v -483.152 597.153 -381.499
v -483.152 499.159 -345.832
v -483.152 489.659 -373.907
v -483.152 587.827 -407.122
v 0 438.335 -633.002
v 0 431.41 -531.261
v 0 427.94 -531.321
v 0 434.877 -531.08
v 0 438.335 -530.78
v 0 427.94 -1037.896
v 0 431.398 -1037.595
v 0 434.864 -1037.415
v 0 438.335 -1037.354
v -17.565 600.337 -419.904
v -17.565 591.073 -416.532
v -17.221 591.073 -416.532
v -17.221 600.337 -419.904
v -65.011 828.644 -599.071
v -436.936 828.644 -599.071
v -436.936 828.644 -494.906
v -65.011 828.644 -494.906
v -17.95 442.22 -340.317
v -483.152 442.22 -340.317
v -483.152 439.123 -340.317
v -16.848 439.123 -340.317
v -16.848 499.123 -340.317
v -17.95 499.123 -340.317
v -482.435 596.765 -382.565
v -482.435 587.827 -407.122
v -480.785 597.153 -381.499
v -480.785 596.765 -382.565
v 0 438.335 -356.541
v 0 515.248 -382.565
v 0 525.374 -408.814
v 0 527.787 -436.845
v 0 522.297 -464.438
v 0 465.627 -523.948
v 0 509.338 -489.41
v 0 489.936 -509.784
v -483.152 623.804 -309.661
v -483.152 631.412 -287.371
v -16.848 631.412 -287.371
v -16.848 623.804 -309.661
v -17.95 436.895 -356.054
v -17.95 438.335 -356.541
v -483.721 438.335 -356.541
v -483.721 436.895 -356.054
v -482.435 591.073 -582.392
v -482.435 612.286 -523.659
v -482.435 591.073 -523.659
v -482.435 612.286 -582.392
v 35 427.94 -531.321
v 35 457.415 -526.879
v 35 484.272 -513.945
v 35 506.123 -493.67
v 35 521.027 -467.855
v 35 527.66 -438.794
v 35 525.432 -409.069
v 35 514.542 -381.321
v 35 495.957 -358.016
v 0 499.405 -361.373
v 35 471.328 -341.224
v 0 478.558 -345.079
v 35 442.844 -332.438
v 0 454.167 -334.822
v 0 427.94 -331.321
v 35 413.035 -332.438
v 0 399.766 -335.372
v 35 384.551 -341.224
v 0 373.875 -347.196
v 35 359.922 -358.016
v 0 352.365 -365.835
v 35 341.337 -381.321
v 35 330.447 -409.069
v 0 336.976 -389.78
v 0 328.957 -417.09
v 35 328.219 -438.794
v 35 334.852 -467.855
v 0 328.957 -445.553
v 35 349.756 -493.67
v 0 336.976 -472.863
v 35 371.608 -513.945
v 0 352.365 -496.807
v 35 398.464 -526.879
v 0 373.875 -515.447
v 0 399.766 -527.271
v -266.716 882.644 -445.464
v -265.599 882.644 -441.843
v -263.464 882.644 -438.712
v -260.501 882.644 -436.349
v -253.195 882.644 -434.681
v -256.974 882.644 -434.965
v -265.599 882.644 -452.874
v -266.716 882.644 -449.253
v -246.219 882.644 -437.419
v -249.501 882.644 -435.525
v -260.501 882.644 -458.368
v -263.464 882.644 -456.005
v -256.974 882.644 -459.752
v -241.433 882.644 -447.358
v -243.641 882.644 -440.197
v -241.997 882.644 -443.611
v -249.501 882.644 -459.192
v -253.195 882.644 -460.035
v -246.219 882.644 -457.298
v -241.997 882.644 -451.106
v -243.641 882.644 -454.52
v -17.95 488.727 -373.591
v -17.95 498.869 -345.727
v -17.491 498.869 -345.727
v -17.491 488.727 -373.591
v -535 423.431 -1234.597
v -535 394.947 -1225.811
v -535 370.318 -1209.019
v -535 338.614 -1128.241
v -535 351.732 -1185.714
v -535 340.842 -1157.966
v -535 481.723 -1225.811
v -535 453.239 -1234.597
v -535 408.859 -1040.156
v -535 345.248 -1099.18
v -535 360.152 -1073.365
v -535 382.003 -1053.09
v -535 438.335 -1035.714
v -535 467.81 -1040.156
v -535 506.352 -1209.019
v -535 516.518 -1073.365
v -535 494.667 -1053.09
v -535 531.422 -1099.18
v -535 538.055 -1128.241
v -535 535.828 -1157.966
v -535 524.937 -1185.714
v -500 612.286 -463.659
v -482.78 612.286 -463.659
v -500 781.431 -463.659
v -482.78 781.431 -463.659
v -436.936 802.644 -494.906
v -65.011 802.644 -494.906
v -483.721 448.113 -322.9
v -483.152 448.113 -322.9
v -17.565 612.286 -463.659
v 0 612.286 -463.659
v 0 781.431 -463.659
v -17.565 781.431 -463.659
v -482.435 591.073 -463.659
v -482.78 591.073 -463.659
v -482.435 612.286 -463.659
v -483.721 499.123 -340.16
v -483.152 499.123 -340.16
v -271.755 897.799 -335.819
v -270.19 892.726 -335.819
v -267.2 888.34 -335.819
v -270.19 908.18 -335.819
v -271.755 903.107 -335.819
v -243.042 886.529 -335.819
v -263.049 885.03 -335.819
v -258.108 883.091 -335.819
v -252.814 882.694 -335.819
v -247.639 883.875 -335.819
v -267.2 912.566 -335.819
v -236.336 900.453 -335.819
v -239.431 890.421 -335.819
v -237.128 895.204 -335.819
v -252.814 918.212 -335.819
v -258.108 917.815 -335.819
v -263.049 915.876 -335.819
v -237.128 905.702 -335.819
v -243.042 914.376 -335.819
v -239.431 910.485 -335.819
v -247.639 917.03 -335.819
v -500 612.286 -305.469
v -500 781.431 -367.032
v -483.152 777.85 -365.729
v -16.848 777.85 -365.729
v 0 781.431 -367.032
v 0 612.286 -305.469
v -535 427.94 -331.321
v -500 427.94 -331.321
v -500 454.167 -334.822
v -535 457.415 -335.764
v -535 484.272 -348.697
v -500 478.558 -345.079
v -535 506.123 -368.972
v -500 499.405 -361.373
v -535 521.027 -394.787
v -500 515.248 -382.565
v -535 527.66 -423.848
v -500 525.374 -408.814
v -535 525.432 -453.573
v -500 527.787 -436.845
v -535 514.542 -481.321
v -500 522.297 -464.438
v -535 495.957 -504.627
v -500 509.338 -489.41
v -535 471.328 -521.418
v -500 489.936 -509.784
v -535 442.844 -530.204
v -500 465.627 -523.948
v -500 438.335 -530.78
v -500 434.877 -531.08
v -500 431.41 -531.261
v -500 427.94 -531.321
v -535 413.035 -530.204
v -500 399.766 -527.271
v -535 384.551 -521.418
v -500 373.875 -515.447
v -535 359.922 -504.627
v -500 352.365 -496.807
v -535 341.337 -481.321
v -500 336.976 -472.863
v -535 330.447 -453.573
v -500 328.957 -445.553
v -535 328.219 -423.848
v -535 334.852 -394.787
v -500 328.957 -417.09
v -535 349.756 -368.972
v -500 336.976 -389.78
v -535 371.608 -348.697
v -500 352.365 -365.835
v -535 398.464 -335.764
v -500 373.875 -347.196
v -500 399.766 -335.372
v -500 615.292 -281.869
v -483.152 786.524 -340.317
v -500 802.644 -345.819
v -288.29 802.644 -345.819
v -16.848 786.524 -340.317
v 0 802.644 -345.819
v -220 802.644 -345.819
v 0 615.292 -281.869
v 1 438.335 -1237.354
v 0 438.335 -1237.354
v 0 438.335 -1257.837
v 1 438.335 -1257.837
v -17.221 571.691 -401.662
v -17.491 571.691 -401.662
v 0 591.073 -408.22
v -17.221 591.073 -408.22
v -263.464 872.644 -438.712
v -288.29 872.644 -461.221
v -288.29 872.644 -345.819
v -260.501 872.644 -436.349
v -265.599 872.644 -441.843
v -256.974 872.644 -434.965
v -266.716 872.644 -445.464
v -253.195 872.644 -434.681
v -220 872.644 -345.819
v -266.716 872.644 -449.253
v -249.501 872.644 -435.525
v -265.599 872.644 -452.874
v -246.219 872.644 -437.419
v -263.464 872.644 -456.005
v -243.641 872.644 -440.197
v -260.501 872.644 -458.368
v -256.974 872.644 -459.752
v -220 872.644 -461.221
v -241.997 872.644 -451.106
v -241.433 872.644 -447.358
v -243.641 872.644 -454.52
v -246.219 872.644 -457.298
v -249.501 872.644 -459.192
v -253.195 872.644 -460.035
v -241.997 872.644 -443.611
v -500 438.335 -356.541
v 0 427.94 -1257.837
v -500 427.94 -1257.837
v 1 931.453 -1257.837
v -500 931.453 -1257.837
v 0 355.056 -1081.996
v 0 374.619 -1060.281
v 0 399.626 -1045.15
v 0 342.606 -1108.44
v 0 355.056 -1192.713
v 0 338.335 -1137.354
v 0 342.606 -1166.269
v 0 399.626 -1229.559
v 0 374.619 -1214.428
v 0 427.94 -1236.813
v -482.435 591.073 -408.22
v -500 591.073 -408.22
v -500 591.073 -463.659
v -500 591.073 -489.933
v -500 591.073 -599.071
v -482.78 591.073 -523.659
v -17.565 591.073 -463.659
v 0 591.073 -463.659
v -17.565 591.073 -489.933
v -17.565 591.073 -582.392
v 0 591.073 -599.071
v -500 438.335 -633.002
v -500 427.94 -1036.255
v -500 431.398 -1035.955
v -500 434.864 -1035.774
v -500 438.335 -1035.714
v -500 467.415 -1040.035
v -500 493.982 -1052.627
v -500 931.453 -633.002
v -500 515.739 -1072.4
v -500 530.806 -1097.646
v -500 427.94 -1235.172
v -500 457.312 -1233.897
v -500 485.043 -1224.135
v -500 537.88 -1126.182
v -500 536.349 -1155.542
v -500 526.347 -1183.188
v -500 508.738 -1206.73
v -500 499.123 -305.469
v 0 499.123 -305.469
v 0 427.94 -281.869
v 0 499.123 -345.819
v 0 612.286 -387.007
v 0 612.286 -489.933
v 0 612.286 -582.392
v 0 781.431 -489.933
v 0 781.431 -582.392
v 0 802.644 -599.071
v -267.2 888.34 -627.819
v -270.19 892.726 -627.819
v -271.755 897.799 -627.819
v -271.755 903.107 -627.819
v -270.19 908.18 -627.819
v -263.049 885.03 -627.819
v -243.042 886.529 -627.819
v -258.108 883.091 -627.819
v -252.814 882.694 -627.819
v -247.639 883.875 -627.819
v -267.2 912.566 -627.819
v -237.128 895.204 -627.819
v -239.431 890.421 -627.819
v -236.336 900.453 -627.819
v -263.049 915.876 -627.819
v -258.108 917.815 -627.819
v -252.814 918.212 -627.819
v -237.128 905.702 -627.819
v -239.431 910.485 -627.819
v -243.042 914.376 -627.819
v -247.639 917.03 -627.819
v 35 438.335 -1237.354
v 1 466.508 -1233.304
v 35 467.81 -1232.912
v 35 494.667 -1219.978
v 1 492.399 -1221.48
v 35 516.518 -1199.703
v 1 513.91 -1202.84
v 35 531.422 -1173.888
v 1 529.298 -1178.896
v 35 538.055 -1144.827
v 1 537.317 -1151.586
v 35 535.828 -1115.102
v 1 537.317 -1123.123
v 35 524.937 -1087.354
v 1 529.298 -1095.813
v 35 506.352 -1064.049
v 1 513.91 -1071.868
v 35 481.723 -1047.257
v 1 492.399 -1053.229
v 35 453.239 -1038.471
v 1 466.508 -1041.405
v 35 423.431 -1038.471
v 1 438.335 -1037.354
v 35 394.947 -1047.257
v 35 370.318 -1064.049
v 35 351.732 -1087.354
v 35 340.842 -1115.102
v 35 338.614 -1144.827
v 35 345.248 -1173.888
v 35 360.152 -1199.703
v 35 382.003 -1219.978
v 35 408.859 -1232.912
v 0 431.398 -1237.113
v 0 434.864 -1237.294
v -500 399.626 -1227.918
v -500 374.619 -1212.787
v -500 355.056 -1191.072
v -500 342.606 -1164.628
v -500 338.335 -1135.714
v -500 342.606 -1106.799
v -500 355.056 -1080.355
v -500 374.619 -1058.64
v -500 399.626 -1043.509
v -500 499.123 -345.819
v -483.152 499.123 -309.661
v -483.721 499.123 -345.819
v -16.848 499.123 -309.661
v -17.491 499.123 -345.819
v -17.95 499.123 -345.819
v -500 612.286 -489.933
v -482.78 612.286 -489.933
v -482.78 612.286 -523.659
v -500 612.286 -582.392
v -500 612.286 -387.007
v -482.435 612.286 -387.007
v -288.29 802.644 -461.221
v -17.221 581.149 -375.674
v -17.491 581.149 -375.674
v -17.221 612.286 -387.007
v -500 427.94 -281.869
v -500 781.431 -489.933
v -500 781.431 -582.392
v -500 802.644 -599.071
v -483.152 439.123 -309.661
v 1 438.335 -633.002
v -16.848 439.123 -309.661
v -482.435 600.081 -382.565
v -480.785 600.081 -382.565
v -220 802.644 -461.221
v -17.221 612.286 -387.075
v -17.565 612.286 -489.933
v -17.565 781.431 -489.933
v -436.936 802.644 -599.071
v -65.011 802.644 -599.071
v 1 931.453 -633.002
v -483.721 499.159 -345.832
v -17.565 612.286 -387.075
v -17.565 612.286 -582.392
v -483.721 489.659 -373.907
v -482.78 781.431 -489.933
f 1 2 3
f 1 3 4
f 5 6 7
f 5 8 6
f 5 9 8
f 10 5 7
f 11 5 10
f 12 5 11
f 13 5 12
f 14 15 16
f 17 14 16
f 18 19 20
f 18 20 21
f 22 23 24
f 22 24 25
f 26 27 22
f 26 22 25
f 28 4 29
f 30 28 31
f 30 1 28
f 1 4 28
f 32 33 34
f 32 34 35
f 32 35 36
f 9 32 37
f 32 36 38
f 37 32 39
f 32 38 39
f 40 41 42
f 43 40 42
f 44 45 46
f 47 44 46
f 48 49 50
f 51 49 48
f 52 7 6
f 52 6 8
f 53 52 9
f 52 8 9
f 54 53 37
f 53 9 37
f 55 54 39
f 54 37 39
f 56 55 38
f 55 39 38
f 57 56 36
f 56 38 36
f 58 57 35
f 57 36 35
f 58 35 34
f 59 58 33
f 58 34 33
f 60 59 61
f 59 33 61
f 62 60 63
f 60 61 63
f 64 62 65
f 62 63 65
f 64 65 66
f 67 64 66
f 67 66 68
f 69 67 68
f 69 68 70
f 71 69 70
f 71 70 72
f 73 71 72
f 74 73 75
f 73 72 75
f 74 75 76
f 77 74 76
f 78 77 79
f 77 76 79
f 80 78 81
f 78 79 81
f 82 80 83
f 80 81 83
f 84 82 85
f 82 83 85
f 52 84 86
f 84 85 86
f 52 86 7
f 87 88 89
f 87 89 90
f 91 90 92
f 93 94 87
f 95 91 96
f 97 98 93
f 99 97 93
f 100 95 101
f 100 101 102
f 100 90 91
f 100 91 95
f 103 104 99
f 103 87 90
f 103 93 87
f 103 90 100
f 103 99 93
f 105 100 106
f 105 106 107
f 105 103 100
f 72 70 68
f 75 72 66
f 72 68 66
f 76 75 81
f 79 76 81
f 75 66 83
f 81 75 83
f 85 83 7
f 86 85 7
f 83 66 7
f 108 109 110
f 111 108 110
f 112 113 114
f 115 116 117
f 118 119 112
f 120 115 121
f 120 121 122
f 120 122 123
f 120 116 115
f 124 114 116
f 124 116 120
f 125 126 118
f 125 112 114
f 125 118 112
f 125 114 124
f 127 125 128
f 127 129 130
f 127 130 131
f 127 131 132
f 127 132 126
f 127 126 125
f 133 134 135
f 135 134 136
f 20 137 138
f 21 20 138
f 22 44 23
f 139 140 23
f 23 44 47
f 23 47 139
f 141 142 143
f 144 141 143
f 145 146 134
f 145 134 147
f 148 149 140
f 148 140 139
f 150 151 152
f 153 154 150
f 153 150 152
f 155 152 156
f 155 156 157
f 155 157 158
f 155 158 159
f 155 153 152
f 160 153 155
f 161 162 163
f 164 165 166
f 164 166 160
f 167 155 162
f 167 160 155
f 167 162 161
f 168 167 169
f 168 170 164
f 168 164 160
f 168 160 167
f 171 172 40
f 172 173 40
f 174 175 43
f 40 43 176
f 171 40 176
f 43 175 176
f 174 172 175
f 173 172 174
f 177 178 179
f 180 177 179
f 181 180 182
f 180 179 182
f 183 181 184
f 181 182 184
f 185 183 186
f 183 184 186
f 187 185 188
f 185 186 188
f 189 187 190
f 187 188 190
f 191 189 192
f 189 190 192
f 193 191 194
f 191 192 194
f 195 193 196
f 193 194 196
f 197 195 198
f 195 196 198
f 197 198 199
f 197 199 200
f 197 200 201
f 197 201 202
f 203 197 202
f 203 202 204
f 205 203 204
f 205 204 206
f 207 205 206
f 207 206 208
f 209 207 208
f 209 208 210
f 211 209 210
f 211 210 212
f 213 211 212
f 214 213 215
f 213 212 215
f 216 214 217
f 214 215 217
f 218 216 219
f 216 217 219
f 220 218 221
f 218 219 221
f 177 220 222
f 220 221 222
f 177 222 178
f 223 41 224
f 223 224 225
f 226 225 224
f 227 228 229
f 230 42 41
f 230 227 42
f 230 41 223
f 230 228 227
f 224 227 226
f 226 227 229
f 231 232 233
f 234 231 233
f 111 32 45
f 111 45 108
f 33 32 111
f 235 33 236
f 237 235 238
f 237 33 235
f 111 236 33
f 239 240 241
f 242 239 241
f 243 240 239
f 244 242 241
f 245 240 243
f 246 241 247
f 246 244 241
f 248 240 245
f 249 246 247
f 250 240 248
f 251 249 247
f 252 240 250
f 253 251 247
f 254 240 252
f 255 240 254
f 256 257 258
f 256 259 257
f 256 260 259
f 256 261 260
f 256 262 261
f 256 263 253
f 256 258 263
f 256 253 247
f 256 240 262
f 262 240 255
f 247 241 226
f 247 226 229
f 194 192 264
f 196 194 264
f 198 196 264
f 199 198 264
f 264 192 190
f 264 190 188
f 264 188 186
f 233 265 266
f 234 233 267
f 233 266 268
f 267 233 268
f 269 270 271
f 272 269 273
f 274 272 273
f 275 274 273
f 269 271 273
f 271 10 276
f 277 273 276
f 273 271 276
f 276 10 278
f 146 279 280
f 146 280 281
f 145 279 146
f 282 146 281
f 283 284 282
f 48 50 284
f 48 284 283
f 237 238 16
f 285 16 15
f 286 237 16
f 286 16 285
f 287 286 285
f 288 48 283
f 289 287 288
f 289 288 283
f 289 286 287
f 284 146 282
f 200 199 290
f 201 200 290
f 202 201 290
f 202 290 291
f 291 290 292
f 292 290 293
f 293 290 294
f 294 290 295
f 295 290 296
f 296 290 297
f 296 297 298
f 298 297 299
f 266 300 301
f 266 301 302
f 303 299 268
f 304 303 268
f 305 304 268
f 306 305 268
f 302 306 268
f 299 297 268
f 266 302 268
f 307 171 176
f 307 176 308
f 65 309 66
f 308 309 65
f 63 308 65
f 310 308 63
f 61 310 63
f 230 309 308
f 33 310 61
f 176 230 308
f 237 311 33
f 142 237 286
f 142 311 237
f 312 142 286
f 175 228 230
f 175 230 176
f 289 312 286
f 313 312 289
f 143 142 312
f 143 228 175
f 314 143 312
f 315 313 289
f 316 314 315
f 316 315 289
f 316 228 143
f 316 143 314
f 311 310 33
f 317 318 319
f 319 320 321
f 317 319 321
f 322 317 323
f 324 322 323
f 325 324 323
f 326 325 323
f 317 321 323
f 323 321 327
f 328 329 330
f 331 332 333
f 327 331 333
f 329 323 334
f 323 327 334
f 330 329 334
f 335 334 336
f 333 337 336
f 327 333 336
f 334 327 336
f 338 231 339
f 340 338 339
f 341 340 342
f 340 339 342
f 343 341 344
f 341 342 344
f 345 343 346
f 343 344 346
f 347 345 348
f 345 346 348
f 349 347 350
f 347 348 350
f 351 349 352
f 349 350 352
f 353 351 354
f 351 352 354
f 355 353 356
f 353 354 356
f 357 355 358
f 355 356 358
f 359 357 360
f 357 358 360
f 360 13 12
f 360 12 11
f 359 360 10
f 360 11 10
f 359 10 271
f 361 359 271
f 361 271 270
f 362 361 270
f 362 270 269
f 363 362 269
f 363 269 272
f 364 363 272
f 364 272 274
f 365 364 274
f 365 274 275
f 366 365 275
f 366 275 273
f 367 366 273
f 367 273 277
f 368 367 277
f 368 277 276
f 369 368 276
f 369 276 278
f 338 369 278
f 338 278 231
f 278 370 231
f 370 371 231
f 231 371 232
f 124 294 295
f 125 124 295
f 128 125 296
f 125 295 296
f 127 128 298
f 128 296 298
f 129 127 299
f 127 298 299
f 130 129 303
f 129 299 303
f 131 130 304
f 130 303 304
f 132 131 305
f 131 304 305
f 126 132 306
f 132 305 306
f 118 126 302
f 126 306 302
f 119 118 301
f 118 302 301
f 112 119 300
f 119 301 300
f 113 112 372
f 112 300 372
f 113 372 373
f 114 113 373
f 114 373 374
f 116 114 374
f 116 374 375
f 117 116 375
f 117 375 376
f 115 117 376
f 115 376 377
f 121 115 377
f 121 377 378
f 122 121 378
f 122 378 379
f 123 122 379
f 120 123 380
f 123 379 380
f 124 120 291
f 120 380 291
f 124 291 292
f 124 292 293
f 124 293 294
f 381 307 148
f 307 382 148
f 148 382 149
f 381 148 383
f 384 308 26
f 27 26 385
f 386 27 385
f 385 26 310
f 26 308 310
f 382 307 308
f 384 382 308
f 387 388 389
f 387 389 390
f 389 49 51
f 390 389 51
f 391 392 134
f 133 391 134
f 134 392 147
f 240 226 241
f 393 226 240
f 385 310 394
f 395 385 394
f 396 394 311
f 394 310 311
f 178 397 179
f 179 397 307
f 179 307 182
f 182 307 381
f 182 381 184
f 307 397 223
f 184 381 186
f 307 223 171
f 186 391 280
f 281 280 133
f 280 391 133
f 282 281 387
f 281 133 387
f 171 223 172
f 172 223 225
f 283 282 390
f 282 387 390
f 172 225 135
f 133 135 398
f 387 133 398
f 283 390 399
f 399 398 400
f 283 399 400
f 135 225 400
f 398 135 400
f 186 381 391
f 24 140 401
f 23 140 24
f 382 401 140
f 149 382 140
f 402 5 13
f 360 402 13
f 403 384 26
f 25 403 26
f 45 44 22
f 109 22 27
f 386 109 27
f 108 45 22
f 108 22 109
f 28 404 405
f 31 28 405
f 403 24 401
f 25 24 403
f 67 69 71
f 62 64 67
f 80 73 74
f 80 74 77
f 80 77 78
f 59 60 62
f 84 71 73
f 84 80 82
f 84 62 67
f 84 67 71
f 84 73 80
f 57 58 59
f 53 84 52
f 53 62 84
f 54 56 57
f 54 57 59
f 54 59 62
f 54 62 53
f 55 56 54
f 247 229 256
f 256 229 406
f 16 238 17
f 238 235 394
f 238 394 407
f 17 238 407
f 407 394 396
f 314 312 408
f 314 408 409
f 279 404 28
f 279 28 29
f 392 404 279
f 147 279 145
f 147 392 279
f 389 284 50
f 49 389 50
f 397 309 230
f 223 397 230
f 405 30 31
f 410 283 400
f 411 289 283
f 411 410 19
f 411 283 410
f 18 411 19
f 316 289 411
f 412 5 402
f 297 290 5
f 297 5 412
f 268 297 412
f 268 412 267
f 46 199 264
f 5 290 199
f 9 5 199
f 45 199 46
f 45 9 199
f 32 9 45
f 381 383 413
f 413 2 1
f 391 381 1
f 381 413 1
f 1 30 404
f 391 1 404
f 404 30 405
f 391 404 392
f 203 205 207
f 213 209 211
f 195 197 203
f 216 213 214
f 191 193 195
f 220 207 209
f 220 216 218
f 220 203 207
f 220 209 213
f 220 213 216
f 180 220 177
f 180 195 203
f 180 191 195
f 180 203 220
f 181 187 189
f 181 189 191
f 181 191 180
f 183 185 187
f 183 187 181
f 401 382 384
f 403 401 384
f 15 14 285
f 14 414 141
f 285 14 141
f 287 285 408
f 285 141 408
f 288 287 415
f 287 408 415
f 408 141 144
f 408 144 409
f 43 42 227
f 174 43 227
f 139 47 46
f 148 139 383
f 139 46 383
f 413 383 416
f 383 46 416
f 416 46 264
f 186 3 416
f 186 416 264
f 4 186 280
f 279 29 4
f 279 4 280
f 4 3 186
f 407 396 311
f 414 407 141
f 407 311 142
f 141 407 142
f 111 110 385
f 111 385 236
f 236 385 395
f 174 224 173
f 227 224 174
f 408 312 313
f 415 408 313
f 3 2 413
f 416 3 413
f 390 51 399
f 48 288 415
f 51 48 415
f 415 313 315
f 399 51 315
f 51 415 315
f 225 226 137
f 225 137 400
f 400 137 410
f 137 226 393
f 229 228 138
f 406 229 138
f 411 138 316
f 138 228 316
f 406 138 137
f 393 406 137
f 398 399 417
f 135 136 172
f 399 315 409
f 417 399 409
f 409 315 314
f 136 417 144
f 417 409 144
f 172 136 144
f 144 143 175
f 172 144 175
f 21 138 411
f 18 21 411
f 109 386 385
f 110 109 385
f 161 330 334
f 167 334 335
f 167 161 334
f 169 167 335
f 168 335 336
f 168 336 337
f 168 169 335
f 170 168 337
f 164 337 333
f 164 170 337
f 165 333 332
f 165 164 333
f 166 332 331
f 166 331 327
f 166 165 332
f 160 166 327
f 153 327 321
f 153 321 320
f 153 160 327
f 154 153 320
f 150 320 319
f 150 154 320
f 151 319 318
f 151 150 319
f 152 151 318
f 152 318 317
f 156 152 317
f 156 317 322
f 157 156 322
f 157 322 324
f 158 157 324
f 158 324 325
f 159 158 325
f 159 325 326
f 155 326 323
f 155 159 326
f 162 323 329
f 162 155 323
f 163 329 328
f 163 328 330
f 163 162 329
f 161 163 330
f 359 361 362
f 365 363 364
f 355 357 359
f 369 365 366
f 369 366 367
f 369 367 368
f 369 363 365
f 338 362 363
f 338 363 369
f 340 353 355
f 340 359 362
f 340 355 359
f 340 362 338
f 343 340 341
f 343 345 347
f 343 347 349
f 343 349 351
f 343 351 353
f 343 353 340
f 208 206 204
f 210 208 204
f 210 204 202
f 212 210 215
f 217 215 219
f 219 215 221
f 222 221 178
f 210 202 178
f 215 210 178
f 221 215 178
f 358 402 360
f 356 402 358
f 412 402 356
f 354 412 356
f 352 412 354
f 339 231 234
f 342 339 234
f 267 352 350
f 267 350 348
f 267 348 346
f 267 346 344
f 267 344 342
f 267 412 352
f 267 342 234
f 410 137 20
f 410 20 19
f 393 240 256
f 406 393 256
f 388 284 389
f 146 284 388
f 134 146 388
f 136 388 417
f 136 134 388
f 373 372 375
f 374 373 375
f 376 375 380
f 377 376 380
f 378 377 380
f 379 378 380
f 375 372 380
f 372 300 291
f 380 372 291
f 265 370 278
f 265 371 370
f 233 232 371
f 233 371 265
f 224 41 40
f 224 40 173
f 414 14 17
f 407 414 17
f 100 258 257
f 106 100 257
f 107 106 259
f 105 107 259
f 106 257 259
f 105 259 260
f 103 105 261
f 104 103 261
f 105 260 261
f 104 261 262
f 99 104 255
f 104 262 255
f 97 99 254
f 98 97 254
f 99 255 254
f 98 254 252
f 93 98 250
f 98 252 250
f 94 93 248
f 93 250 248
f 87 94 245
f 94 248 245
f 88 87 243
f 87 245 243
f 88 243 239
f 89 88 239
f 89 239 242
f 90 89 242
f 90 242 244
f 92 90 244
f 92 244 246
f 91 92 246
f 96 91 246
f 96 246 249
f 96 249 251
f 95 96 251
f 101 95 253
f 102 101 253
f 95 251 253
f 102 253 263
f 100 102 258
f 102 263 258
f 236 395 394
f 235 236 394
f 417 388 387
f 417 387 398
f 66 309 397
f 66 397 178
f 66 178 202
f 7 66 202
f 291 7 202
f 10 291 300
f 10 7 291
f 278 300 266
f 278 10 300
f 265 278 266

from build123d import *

# Parameters (mm, degrees)
IZIM2_W                           = 624.83438286
IZIM2_H                           = 493.118424104
Y_KSEKLIK_EKSTR_ZYON1_DEPTH       = 500
IZIM4_R                           = 100
Y_KSEKLIK_EKSTR_ZYON2_DEPTH       = 35
IZIM5_W                           = 975.967830922
IZIM5_H                           = 10.395315862
Y_KSEKLIK_EKSTR_ZYON3_DEPTH       = 500
IZIM6_W                           = 317.202351564
IZIM6_H                           = 374.704466417
Y_KSEKLIK_EKSTR_ZYON4_DEPTH       = 500
KES_EKSTR_ZYON1_DEPTH             = 500
KES_EKSTR_ZYON2_DEPTH             = 500
KES_EKSTR_ZYON3_DEPTH             = 500
IZIM11_R                          = 100
Y_KSEKLIK_EKSTR_ZYON5_DEPTH       = 35
IZIM12_W                          = 466.303391348
IZIM12_H                          = 163.89871841
KES_EKSTR_ZYON4_DEPTH             = 35
IZIM17_W                          = 464.870730912
IZIM17_H                          = 199.827267797
KES_EKSTR_ZYON7_DEPTH             = 35
IZIM20_W                          = 465.660425645
IZIM20_H                          = 104.591429086
KES_EKSTR_ZYON8_DEPTH             = 35
IZIM21_W                          = 463.56331291
IZIM21_H                          = 33.15833205
KES_EKSTR_ZYON9_DEPTH             = 35
IZIM22_W                          = 465.770217683
IZIM22_H                          = 55.70279957
KES_EKSTR_ZYON10_DEPTH            = 35
IZIM23_W                          = 466.303391348
IZIM23_H                          = 30.655819637
KES_EKSTR_ZYON11_DEPTH            = 60
IZIM25_W                          = 26.274086754
IZIM25_H                          = 211.571078613
Y_KSEKLIK_EKSTR_ZYON6_DEPTH       = 500
IZIM27_W                          = 465.215365456
IZIM27_H                          = 190.357875177
KES_EKSTR_ZYON12_DEPTH            = 60
IZIM28_R                          = 100
Y_KSEKLIK_EKSTR_ZYON7_DEPTH       = 35
IZIM46_W                          = 68.290210942
IZIM46_H                          = 115.402230531
Y_KSEKLIK_EKSTR_ZYON14_DEPTH      = 70
IZIM47_R                          = 12.712595137
Y_KSEKLIK_EKSTR_ZYON15_DEPTH      = 10
IZIM48_R                          = 17.808743389
Y_KSEKLIK_EKSTR_ZYON18_DEPTH      = 10
Y_KSEKLIK_EKSTR_ZYON18_DEPTH_BACK = 282
IZIM49_W                          = 371.925281581
IZIM49_H                          = 104.164908848
Y_KSEKLIK_EKSTR_ZYON19_DEPTH      = 26
IZIM54_W                          = 624.83438286
IZIM54_H                          = 493.118424104
Y_KSEKLIK_EKSTR_ZYON20_DEPTH      = 1


with BuildPart() as part:
    # Çizim2 → Yükseklik-Ekstrüzyon1 (new body)
    with BuildSketch(Plane(origin=(0, 0, 0), x_dir=(0, 0, -1), z_dir=(1, 0, 0))):
        with Locations((945.419542605, 684.894087956)):
            Rectangle(IZIM2_W, IZIM2_H)
    extrude(amount=-Y_KSEKLIK_EKSTR_ZYON1_DEPTH)

    # Çizim4 → Yükseklik-Ekstrüzyon2 (add)
    with BuildSketch(Plane(origin=(0, 0, 0), x_dir=(0, 0, -1), z_dir=(1, 0, 0))):
        with Locations((1137.354295612, 438.334875904)):
            Circle(IZIM4_R)
    extrude(amount=Y_KSEKLIK_EKSTR_ZYON2_DEPTH)

    # Çizim5 → Yükseklik-Ekstrüzyon3 (add)
    with BuildSketch(Plane(origin=(0, 0, 0), x_dir=(0, 0, -1), z_dir=(1, 0, 0))):
        with Locations((769.852818574, 433.137217973)):
            Rectangle(IZIM5_W, IZIM5_H)
    extrude(amount=-Y_KSEKLIK_EKSTR_ZYON3_DEPTH)

    # Çizim6 → Yükseklik-Ekstrüzyon4 (add)
    with BuildSketch(Plane(origin=(0, 0, 0), x_dir=(0, 0, -1), z_dir=(1, 0, 0))):
        with Locations((440.470078895, 615.291793251)):
            Rectangle(IZIM6_W, IZIM6_H)
    extrude(amount=-Y_KSEKLIK_EKSTR_ZYON4_DEPTH)

    # Çizim7 → Kes-Ekstrüzyon1 (cut)
    with BuildSketch(Plane(origin=(0, 0, 0), x_dir=(0, 0, -1), z_dir=(1, 0, 0))):
        Polygon((281.868903113, 802.644026459), (345.819234143, 802.644026459), (281.868903113, 615.29179325), align=None)
    extrude(amount=-KES_EKSTR_ZYON1_DEPTH, mode=Mode.SUBTRACT)

    # Çizim8 → Kes-Ekstrüzyon2 (cut)
    with BuildSketch(Plane(origin=(0, 0, 0), x_dir=(0, 0, -1), z_dir=(1, 0, 0))):
        Polygon((367.032437579, 781.430823023), (305.46881178, 612.286151281), (305.46881178, 499.123252309), (345.819234143, 499.123252309), (387.007160993, 612.286151281), (582.392266599, 612.286151281), (582.392266599, 781.430823023), align=None)
    extrude(amount=-KES_EKSTR_ZYON2_DEPTH, mode=Mode.SUBTRACT)

    # Çizim10 → Kes-Ekstrüzyon3 (cut)
    with BuildSketch(Plane(origin=(0, 0, 0), x_dir=(0, 0, -1), z_dir=(1, 0, 0))):
        Polygon((599.071254677, 438.334875904), (356.541223106, 438.334875904), (408.220364428, 591.072947846), (599.071254677, 591.072947846), align=None)
    extrude(amount=-KES_EKSTR_ZYON3_DEPTH, mode=Mode.SUBTRACT)

    # Çizim11 → Yükseklik-Ekstrüzyon5 (add)
    with BuildSketch(Plane(origin=(0, 0, 0), x_dir=(0, 0, -1), z_dir=(1, 0, 0))):
        with Locations((431.321316174, 427.939560042)):
            Circle(IZIM11_R)
    extrude(amount=Y_KSEKLIK_EKSTR_ZYON5_DEPTH)

    # Çizim12 → Kes-Ekstrüzyon4 (cut)
    with BuildSketch(Plane(origin=(0, -21.964844226, -64.349355999), x_dir=(1, 0, 0), z_dir=(0, 0.323037077, 0.94638631))):
        with Locations((-250, 772.34079435)):
            Rectangle(IZIM12_W, IZIM12_H)
    extrude(amount=-KES_EKSTR_ZYON4_DEPTH, mode=Mode.SUBTRACT)

    # Çizim17 → Kes-Ekstrüzyon7 (cut)
    with BuildSketch(Plane(origin=(0, 612.286151281, 0), x_dir=(1, 0, 0), z_dir=(0, 1, 0))):
        with Locations((-250, 482.478632701)):
            Rectangle(IZIM17_W, IZIM17_H)
    extrude(amount=-KES_EKSTR_ZYON7_DEPTH, mode=Mode.SUBTRACT)

    # Çizim20 → Kes-Ekstrüzyon8 (cut)
    with BuildSketch(Plane(origin=(0, -52.757830226, -144.950947246), x_dir=(1, 0, 0), z_dir=(0, 0.342020143, 0.939692621))):
        with Locations((-250.321482852, 639.324434245)):
            Rectangle(IZIM20_W, IZIM20_H)
    extrude(amount=-KES_EKSTR_ZYON8_DEPTH, mode=Mode.SUBTRACT)

    # Çizim21 → Kes-Ekstrüzyon9 (cut)
    with BuildSketch(Plane(origin=(0, -52.757830226, -144.950947246), x_dir=(1, 0, 0), z_dir=(0, 0.342020143, 0.939692621))):
        with Locations((-249.003107825, 691.169166414)):
            Rectangle(IZIM21_W, IZIM21_H)
    extrude(amount=-KES_EKSTR_ZYON9_DEPTH, mode=Mode.SUBTRACT)

    # Çizim22 → Kes-Ekstrüzyon10 (cut)
    with BuildSketch(Plane(origin=(0, -63.217651249, -186.84022059), x_dir=(-1, 0, 0), z_dir=(0, -0.320502572, -0.947247645))):
        with Locations((250.835570057, 555.815526561)):
            Rectangle(IZIM22_W, IZIM22_H)
    extrude(amount=-KES_EKSTR_ZYON10_DEPTH, mode=Mode.SUBTRACT)

    # Çizim23 → Kes-Ekstrüzyon11 (cut)
    with BuildSketch(Plane(origin=(0, 499.123252309, 0), x_dir=(1, 0, 0), z_dir=(0, 1, 0))):
        with Locations((-250, 324.988840267)):
            Rectangle(IZIM23_W, IZIM23_H)
    extrude(amount=-KES_EKSTR_ZYON11_DEPTH, mode=Mode.SUBTRACT)

    # Çizim25 → Yükseklik-Ekstrüzyon6 (add)
    with BuildSketch(Plane(origin=(0, 0, 0), x_dir=(0, 0, -1), z_dir=(1, 0, 0))):
        with Locations((476.795697093, 696.858487153)):
            Rectangle(IZIM25_W, IZIM25_H)
    extrude(amount=-Y_KSEKLIK_EKSTR_ZYON6_DEPTH)

    # Çizim27 → Kes-Ekstrüzyon12 (cut)
    with BuildSketch(Plane.XY.offset(-463.658653716)):
        with Locations((-250.172317272, 686.251885435)):
            Rectangle(IZIM27_W, IZIM27_H)
    extrude(amount=-KES_EKSTR_ZYON12_DEPTH, mode=Mode.SUBTRACT)

    # Çizim28 → Yükseklik-Ekstrüzyon7 (add)
    with BuildSketch(Plane.ZY.offset(500)):
        with Locations((-431.321316174, 427.939560042)):
            Circle(IZIM28_R)
        with Locations((-1135.713642363, 438.334875904)):
            Circle(IZIM28_R)
    extrude(amount=Y_KSEKLIK_EKSTR_ZYON7_DEPTH)

    # Çizim46 → Yükseklik-Ekstrüzyon14 (add)
    with BuildSketch(Plane(origin=(0, 802.644026459, 0), x_dir=(1, 0, 0), z_dir=(0, 1, 0))):
        with Locations((-254.145105471, 403.520349409)):
            Rectangle(IZIM46_W, IZIM46_H)
    extrude(amount=Y_KSEKLIK_EKSTR_ZYON14_DEPTH)

    # Çizim47 → Yükseklik-Ekstrüzyon15 (add)
    with BuildSketch(Plane(origin=(0, 872.644026459, 0), x_dir=(1, 0, 0), z_dir=(0, 1, 0))):
        with Locations((-254.145105471, 447.358410318)):
            Circle(IZIM47_R)
    extrude(amount=Y_KSEKLIK_EKSTR_ZYON15_DEPTH)

    # Çizim49 → Yükseklik-Ekstrüzyon19 (add)
    with BuildSketch(Plane(origin=(0, 802.644026459, 0), x_dir=(1, 0, 0), z_dir=(0, 1, 0))):
        with Locations((-250.97344325, 546.988800253)):
            Rectangle(IZIM49_W, IZIM49_H)
    extrude(amount=Y_KSEKLIK_EKSTR_ZYON19_DEPTH)

    # Çizim54 → Yükseklik-Ekstrüzyon20 (add)
    with BuildSketch(Plane(origin=(0, 0, 0), x_dir=(0, 0, -1), z_dir=(1, 0, 0))):
        with Locations((945.419542605, 684.894087956)):
            Rectangle(IZIM54_W, IZIM54_H)
    extrude(amount=Y_KSEKLIK_EKSTR_ZYON20_DEPTH)


with BuildPart() as body_2:
    # Çizim48 → Yükseklik-Ekstrüzyon18 (new body, two sides)
    with BuildSketch(Plane.XY.offset(-345.819234143)) as y_kseklik_ekstr_zyon18_sk:
        with Locations((-254.145105471, 900.452769847)):
            Circle(IZIM48_R)
    extrude(amount=Y_KSEKLIK_EKSTR_ZYON18_DEPTH)
    extrude(y_kseklik_ekstr_zyon18_sk.sketch, amount=-Y_KSEKLIK_EKSTR_ZYON18_DEPTH_BACK)


solid = Compound([part.part, body_2.part])
